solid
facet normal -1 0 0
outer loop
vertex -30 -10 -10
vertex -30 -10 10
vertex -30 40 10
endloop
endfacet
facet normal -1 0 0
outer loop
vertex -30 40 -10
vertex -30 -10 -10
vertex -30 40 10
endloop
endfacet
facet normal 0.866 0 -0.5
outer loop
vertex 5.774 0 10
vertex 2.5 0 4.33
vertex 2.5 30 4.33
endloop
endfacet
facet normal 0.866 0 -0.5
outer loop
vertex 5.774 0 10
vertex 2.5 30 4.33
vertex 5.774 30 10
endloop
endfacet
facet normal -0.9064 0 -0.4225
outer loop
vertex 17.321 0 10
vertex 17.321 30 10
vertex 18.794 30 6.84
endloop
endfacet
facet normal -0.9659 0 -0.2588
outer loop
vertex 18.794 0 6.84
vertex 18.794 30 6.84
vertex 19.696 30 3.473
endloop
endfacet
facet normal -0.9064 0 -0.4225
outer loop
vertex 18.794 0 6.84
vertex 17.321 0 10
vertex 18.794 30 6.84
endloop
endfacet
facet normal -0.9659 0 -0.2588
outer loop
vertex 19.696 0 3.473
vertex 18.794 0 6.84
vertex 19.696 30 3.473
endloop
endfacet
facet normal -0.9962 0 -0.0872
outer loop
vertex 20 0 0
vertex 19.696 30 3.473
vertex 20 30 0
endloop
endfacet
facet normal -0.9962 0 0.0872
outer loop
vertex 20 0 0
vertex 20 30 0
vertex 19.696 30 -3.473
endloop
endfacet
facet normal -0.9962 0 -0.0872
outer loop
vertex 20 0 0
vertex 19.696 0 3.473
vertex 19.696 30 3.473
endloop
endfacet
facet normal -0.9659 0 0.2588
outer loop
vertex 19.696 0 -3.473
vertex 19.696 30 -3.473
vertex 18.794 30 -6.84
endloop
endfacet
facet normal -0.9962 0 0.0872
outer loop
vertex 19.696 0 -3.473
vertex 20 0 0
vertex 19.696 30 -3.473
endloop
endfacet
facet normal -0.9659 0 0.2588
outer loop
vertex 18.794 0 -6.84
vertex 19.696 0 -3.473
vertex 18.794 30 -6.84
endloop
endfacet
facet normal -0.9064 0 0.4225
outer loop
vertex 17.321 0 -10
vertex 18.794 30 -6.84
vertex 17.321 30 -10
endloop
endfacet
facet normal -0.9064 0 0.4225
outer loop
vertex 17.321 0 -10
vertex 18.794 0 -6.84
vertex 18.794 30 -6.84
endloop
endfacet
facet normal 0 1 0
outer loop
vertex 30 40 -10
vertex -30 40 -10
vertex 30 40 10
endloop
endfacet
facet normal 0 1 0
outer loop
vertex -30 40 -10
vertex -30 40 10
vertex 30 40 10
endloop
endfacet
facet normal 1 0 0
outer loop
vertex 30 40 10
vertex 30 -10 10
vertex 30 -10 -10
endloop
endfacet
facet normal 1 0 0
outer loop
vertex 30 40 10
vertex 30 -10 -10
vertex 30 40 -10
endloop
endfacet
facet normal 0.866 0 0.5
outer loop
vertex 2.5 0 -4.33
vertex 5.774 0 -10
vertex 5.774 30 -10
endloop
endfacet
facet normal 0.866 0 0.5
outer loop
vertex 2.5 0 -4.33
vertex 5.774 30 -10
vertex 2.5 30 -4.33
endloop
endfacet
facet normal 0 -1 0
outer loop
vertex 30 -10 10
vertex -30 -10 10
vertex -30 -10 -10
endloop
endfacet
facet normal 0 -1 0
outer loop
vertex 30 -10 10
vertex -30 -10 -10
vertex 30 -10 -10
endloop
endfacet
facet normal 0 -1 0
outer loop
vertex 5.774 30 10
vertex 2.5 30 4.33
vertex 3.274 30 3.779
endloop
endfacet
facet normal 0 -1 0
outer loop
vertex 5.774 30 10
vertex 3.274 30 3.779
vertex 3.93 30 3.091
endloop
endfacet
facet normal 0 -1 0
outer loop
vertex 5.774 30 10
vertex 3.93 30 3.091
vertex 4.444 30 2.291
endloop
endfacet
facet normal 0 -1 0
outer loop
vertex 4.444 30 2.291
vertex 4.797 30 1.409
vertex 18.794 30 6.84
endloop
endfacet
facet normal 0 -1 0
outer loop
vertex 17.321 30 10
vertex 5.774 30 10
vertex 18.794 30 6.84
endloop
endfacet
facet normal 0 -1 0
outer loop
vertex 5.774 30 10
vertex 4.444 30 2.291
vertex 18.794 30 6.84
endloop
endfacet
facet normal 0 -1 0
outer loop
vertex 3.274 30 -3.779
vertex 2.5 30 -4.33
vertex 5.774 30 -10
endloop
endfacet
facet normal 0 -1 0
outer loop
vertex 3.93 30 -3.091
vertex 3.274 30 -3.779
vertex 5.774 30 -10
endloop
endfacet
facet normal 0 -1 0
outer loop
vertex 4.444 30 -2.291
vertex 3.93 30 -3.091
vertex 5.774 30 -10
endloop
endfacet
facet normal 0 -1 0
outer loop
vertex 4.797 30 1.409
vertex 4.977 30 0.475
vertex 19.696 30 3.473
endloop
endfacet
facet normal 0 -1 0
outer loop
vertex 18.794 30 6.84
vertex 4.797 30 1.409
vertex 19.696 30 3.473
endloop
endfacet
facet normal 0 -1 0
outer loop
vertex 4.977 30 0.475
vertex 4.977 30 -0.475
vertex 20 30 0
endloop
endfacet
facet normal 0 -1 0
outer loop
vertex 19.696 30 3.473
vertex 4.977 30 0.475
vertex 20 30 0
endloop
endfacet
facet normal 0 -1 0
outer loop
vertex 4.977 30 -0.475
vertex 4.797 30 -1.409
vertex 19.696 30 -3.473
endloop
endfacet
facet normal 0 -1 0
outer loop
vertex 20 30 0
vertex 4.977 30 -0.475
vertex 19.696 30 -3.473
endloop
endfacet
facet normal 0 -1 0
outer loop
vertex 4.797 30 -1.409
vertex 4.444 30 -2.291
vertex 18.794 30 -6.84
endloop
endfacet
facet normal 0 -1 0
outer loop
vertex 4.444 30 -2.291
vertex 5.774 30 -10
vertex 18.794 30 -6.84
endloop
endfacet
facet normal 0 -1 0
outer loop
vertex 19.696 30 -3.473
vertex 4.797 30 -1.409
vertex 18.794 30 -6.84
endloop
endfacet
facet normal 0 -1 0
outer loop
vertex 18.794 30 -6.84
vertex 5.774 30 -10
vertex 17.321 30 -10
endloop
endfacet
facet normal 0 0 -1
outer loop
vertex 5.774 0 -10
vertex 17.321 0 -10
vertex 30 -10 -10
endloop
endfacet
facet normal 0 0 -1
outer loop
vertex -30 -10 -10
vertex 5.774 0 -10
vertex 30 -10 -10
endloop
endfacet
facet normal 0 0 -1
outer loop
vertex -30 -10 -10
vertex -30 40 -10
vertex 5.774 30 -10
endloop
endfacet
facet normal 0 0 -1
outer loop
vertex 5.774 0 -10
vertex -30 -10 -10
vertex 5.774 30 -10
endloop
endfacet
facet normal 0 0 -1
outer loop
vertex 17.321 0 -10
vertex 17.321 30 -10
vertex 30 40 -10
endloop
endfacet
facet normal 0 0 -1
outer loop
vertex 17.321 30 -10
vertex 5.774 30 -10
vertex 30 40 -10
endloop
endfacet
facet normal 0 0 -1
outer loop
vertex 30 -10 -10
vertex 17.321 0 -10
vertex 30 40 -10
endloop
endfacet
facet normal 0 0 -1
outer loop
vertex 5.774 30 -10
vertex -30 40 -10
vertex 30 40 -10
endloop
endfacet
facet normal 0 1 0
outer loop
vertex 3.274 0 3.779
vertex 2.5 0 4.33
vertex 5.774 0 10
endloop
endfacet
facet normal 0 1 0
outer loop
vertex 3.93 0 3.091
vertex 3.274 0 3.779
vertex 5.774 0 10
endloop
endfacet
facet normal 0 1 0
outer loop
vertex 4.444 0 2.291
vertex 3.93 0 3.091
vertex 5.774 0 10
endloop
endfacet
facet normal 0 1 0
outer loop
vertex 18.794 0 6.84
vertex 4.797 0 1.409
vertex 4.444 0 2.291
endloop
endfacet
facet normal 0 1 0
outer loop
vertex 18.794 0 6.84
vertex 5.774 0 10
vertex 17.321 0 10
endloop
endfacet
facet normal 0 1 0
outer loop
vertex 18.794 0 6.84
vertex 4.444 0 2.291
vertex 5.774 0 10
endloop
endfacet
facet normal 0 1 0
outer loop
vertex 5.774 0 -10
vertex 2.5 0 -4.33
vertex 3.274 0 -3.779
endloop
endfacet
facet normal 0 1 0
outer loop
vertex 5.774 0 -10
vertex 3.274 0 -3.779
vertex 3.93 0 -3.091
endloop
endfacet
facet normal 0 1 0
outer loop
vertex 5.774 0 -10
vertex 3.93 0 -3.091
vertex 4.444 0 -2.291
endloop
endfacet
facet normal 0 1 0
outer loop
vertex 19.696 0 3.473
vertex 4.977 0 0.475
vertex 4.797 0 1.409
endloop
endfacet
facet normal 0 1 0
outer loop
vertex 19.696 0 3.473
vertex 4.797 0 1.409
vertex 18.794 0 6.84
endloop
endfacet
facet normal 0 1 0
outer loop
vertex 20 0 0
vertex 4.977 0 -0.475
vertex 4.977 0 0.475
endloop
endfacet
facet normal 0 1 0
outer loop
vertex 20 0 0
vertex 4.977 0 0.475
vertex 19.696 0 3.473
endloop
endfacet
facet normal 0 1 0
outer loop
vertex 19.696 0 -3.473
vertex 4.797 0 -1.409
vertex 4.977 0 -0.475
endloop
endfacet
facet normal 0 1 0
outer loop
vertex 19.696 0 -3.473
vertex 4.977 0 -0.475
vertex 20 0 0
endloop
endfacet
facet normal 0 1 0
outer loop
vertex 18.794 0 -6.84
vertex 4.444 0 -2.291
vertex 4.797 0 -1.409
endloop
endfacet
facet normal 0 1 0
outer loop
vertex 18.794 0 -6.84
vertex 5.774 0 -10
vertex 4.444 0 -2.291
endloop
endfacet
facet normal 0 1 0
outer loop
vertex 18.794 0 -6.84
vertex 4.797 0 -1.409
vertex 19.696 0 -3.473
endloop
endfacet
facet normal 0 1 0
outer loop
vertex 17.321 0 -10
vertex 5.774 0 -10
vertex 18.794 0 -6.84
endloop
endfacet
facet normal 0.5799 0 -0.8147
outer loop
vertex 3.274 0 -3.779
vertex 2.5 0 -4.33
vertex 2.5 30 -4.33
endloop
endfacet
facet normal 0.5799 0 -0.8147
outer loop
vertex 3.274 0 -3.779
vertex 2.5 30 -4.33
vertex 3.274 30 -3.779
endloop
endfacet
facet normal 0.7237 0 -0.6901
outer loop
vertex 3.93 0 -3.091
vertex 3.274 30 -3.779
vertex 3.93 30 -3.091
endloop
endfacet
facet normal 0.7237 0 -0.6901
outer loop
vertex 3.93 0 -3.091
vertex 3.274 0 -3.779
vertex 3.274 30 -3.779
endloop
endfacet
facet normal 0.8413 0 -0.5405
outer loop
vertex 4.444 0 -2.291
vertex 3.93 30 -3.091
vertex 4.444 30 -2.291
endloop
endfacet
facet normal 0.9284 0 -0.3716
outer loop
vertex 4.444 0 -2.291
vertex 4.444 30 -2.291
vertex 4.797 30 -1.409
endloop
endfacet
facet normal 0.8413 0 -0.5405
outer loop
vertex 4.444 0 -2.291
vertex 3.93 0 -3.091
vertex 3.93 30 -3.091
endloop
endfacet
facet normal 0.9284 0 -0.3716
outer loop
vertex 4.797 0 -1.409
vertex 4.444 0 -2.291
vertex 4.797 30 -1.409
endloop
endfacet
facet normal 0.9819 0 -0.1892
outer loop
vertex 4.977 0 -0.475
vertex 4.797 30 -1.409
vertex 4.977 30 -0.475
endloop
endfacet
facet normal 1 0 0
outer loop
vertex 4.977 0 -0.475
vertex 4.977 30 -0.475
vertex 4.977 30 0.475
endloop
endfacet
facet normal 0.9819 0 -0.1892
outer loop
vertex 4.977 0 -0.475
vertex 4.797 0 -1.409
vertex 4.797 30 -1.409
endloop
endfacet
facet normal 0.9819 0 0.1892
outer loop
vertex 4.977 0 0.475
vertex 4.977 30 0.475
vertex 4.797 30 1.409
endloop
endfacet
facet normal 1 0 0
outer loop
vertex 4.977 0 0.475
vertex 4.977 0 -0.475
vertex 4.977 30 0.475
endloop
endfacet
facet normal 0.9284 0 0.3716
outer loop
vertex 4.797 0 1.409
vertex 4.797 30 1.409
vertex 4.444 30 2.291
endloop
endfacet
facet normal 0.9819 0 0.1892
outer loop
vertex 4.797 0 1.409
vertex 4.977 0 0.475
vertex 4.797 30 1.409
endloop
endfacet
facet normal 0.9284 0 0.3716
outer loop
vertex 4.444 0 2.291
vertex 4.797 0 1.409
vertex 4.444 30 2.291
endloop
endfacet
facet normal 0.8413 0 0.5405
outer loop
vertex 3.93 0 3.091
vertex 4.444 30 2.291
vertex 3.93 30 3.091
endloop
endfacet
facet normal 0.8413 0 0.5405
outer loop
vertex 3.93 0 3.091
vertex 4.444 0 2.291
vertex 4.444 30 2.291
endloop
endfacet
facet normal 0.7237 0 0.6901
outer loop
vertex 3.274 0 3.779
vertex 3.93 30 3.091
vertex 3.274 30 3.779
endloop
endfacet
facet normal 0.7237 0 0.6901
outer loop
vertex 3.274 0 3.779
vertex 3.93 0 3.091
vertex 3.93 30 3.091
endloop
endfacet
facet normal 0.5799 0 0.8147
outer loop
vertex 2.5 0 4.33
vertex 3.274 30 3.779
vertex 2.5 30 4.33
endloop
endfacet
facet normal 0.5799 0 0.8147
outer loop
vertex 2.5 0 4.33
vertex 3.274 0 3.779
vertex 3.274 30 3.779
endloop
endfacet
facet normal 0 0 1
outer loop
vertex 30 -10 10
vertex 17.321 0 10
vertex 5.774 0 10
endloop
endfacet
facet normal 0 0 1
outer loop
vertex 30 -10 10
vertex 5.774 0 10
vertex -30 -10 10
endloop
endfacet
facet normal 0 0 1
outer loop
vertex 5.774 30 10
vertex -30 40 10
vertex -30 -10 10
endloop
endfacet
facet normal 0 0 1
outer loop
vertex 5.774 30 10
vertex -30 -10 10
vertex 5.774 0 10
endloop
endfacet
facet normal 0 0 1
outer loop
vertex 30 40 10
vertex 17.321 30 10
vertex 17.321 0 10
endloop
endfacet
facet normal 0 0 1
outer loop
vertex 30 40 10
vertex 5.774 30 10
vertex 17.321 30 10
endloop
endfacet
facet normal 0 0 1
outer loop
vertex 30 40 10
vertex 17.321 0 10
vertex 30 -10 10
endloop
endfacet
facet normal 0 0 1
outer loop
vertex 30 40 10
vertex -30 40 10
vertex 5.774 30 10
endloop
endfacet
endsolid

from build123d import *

# Parameters (mm, degrees)
SKETCH1_W           = 60
SKETCH1_H           = 50
BOSS_EXTRUDE1_DEPTH = 10
CUT_REVOLVE1_DEPTH  = 30


# Read off the part's stored shape, not the designer's step: Cut-Revolve1
with BuildPart() as part:
    # Sketch1 → Boss-Extrude1 (new, symmetric)
    with BuildSketch(Plane.XY):
        with Locations((0, 15)):
            Rectangle(SKETCH1_W, SKETCH1_H)
    extrude(amount=BOSS_EXTRUDE1_DEPTH, both=True)

    # Cut-Revolve1 outline → Cut-Revolve1 (cut)
    with BuildSketch(Plane(origin=(0, 0, 0), x_dir=(1, 0, 0), z_dir=(0, 1, 0))):
        with BuildLine():
            ThreePointArc((17.320508076, -10), (20, 0), (17.320508076, 10))
            Line((17.320508076, 10), (5.773502692, 10))
            Line((5.773502692, 10), (2.5, 4.330127019))
            ThreePointArc((2.5, 4.330127019), (5, 0), (2.5, -4.330127019))
            Line((2.5, -4.330127019), (5.773502692, -10))
            Line((5.773502692, -10), (17.320508076, -10))
        make_face()
    extrude(amount=CUT_REVOLVE1_DEPTH, mode=Mode.SUBTRACT)


solid = part.part
